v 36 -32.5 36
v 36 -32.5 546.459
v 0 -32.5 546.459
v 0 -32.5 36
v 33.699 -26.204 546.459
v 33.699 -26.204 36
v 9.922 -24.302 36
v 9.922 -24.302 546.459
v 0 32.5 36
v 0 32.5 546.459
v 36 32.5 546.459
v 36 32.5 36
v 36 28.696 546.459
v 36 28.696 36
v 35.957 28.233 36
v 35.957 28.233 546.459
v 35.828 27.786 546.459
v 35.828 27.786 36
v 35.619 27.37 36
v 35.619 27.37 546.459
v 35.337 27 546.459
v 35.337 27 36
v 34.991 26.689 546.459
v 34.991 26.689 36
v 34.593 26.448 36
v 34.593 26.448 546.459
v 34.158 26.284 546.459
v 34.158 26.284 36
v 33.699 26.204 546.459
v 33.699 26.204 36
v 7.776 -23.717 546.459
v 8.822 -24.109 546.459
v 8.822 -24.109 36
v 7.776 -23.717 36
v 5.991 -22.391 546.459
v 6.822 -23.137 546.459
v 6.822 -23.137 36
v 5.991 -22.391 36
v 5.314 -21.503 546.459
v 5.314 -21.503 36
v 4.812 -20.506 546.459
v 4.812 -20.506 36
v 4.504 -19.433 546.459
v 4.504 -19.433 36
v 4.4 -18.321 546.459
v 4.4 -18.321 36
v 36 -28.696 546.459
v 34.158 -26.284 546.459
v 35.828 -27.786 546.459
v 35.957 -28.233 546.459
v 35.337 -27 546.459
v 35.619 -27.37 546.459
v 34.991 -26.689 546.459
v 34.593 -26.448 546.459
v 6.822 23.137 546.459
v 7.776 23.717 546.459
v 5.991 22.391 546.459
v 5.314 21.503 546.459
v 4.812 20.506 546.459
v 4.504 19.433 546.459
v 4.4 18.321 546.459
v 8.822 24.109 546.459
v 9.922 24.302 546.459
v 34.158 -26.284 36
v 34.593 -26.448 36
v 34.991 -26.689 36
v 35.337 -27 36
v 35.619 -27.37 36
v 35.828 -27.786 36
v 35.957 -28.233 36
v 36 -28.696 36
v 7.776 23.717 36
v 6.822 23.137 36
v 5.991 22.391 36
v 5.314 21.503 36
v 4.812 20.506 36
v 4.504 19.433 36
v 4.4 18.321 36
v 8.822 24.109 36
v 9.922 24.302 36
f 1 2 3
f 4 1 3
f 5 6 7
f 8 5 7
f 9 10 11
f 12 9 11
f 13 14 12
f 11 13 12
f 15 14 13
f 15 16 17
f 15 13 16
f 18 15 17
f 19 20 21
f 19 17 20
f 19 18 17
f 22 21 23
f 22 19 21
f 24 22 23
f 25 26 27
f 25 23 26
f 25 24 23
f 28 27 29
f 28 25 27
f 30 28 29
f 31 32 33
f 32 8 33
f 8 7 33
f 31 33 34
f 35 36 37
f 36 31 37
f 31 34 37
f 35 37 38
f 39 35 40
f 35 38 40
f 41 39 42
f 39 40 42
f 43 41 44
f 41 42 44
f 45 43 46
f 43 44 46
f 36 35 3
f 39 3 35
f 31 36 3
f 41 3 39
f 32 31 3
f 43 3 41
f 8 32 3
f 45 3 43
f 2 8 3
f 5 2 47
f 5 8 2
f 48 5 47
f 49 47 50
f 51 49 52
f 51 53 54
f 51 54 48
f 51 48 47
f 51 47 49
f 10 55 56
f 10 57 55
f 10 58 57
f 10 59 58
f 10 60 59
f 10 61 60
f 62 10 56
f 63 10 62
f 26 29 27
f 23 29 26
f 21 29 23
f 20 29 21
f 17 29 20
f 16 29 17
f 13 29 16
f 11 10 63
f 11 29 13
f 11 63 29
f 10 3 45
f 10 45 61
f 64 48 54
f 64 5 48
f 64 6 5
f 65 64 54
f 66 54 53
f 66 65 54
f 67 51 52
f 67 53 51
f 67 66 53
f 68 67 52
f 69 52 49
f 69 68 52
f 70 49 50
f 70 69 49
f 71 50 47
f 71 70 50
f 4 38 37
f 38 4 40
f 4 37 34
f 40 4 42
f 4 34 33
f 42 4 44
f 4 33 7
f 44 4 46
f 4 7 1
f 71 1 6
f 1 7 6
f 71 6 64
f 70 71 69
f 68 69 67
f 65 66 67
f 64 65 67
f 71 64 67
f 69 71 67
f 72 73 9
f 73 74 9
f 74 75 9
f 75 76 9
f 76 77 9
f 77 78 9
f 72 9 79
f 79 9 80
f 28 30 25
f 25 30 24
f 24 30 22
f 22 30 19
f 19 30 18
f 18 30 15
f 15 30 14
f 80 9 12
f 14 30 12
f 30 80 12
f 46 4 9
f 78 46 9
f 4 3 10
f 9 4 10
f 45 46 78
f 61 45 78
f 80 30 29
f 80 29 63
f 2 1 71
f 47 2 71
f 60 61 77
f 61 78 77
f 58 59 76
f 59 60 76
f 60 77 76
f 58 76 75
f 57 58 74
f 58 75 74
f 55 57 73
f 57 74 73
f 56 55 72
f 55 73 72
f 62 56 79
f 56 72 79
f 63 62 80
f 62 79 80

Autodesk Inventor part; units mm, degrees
ref_plane "Начальная плоскость" through (0, 0, 36) normal (0, 0, 1) x (1, 0, 0)
ref_plane "Конечная плоскость" through (0, 0, 546.459) normal (0, 0, 1) x (1, 0, 0)
sketch "Эскиз" plane through (0, 0, 0) normal (0, 0, 1) x (1, 0, 0)
  line L0 (36, -32.5) -> (0, -32.5)
  line L1 (36, -32.5) -> (36, -28.696)
  line L2 (33.6994, -26.2039) -> (9.9215, -24.3017)
  line L3 (4.4, -18.3208) -> (4.4, 18.3208)
  line L4 (33.6994, 26.2039) -> (9.9215, 24.3017)
  line L5 (36, 28.696) -> (36, 32.5)
  line L6 (0, 32.5) -> (36, 32.5)
  line L7 (0, -32.5) -> (0, 32.5)
  arc A0 (4.4, -18.3208) -> (9.9215, -24.3017) centre (10.4, -18.3208) ccw
  arc A1 (9.9215, 24.3017) -> (4.4, 18.3208) centre (10.4, 18.3208) ccw
  arc A2 (36, -28.696) -> (33.6994, -26.2039) centre (33.5, -28.696) ccw
  arc A3 (33.6994, 26.2039) -> (36, 28.696) centre (33.5, 28.696) ccw
  line L8 (0, 45.5) -> (0, -45.5) construction
  line L9 (-7.2974, 0) -> (43.7847, 0) construction
  point P0 (36, -26.388)
  point P1 (4.4, -23.86)
  point P2 (4.4, 23.86)
  point P3 (36, 26.388)
  dimension "d3" = 36
  dimension "d5" = 4.4
  dimension "d7" = 65
  dimension "d9" = 8.64
  dimension "d11" = 8.64
  dimension "d13" = 6.112
  dimension "d15" = 6.112
  dimension "d22" = 6
  dimension "d23" = 2.5
  dimension "d24" = 32.5
  dimension "d25" = 0
extrude "Тело" add sketch "Эскиз" along normal up to surface (510.459 mm away) from surface at 36
sketch "Sketch3" plane through (0, 0, 0) normal (0, 0, 1) x (1, 0, 0)
  line L0 (0, 0) -> (10, 0)
ref_plane "Work Plane7" through (0, 0, 0) normal (0, -1, 0) x (1, 0, 0)
sketch "Sketch4" plane through (0, 0, 0) normal (0, -1, 0) x (1, 0, 0)
  line L0 (-2, 36) -> (12, 36)
  line L1 (-2, 546.459) -> (12, 546.459)
  dimension "d29" = 510.459
ref_plane "РабПлоскость8" through (86.12, 0, 36) normal (0, 0, -1) x (-1, 0, 0)
split "Разделение1" plane through (86.12, 0, 36) removes the side toward (0, 0, -1)
equation "\"d3\" = b"
equation "\"d5\" = t1"
equation "\"d7\" = ParH"
equation "\"d9\" = msp_x1 + t2"
equation "\"d11\" = msp_x1 + t2"
equation "\"d13\" = -msp_x2 + t2"
equation "\"d15\" = -msp_x2 + t2"
equation "\"d22\" = R"
equation "\"d23\" = R1"
equation "\"d24\" = 0.5 * d7"
equation "\"d16\" = G_L"
equation "\"R1\" = 2.5"
equation "\"R\" = 6"
equation "\"t1\" = 4.4"
equation "\"t2\" = 7.2"
equation "\"ParH\" = 65"
equation "\"b\" = 36"
equation "\"msp_x1\" = 0.04 * b"
equation "\"msp_x2\" = -0.08 * t1 + 0.04 * b"
equation "\"G_L\" = d29"
equation "\"ex\" = 0"
equation "\"G_OFFSET_START\" = -36"
equation "\"G_OFFSET_END\" = 0"
equation "\"d26\" = -G_OFFSET_START"
equation "\"d27\" = G_OFFSET_END + B_L"
equation "\"B_L\" = 546.459"
properties part number "Швеллер 6.5U-510,46 ГОСТ 8240-97"
